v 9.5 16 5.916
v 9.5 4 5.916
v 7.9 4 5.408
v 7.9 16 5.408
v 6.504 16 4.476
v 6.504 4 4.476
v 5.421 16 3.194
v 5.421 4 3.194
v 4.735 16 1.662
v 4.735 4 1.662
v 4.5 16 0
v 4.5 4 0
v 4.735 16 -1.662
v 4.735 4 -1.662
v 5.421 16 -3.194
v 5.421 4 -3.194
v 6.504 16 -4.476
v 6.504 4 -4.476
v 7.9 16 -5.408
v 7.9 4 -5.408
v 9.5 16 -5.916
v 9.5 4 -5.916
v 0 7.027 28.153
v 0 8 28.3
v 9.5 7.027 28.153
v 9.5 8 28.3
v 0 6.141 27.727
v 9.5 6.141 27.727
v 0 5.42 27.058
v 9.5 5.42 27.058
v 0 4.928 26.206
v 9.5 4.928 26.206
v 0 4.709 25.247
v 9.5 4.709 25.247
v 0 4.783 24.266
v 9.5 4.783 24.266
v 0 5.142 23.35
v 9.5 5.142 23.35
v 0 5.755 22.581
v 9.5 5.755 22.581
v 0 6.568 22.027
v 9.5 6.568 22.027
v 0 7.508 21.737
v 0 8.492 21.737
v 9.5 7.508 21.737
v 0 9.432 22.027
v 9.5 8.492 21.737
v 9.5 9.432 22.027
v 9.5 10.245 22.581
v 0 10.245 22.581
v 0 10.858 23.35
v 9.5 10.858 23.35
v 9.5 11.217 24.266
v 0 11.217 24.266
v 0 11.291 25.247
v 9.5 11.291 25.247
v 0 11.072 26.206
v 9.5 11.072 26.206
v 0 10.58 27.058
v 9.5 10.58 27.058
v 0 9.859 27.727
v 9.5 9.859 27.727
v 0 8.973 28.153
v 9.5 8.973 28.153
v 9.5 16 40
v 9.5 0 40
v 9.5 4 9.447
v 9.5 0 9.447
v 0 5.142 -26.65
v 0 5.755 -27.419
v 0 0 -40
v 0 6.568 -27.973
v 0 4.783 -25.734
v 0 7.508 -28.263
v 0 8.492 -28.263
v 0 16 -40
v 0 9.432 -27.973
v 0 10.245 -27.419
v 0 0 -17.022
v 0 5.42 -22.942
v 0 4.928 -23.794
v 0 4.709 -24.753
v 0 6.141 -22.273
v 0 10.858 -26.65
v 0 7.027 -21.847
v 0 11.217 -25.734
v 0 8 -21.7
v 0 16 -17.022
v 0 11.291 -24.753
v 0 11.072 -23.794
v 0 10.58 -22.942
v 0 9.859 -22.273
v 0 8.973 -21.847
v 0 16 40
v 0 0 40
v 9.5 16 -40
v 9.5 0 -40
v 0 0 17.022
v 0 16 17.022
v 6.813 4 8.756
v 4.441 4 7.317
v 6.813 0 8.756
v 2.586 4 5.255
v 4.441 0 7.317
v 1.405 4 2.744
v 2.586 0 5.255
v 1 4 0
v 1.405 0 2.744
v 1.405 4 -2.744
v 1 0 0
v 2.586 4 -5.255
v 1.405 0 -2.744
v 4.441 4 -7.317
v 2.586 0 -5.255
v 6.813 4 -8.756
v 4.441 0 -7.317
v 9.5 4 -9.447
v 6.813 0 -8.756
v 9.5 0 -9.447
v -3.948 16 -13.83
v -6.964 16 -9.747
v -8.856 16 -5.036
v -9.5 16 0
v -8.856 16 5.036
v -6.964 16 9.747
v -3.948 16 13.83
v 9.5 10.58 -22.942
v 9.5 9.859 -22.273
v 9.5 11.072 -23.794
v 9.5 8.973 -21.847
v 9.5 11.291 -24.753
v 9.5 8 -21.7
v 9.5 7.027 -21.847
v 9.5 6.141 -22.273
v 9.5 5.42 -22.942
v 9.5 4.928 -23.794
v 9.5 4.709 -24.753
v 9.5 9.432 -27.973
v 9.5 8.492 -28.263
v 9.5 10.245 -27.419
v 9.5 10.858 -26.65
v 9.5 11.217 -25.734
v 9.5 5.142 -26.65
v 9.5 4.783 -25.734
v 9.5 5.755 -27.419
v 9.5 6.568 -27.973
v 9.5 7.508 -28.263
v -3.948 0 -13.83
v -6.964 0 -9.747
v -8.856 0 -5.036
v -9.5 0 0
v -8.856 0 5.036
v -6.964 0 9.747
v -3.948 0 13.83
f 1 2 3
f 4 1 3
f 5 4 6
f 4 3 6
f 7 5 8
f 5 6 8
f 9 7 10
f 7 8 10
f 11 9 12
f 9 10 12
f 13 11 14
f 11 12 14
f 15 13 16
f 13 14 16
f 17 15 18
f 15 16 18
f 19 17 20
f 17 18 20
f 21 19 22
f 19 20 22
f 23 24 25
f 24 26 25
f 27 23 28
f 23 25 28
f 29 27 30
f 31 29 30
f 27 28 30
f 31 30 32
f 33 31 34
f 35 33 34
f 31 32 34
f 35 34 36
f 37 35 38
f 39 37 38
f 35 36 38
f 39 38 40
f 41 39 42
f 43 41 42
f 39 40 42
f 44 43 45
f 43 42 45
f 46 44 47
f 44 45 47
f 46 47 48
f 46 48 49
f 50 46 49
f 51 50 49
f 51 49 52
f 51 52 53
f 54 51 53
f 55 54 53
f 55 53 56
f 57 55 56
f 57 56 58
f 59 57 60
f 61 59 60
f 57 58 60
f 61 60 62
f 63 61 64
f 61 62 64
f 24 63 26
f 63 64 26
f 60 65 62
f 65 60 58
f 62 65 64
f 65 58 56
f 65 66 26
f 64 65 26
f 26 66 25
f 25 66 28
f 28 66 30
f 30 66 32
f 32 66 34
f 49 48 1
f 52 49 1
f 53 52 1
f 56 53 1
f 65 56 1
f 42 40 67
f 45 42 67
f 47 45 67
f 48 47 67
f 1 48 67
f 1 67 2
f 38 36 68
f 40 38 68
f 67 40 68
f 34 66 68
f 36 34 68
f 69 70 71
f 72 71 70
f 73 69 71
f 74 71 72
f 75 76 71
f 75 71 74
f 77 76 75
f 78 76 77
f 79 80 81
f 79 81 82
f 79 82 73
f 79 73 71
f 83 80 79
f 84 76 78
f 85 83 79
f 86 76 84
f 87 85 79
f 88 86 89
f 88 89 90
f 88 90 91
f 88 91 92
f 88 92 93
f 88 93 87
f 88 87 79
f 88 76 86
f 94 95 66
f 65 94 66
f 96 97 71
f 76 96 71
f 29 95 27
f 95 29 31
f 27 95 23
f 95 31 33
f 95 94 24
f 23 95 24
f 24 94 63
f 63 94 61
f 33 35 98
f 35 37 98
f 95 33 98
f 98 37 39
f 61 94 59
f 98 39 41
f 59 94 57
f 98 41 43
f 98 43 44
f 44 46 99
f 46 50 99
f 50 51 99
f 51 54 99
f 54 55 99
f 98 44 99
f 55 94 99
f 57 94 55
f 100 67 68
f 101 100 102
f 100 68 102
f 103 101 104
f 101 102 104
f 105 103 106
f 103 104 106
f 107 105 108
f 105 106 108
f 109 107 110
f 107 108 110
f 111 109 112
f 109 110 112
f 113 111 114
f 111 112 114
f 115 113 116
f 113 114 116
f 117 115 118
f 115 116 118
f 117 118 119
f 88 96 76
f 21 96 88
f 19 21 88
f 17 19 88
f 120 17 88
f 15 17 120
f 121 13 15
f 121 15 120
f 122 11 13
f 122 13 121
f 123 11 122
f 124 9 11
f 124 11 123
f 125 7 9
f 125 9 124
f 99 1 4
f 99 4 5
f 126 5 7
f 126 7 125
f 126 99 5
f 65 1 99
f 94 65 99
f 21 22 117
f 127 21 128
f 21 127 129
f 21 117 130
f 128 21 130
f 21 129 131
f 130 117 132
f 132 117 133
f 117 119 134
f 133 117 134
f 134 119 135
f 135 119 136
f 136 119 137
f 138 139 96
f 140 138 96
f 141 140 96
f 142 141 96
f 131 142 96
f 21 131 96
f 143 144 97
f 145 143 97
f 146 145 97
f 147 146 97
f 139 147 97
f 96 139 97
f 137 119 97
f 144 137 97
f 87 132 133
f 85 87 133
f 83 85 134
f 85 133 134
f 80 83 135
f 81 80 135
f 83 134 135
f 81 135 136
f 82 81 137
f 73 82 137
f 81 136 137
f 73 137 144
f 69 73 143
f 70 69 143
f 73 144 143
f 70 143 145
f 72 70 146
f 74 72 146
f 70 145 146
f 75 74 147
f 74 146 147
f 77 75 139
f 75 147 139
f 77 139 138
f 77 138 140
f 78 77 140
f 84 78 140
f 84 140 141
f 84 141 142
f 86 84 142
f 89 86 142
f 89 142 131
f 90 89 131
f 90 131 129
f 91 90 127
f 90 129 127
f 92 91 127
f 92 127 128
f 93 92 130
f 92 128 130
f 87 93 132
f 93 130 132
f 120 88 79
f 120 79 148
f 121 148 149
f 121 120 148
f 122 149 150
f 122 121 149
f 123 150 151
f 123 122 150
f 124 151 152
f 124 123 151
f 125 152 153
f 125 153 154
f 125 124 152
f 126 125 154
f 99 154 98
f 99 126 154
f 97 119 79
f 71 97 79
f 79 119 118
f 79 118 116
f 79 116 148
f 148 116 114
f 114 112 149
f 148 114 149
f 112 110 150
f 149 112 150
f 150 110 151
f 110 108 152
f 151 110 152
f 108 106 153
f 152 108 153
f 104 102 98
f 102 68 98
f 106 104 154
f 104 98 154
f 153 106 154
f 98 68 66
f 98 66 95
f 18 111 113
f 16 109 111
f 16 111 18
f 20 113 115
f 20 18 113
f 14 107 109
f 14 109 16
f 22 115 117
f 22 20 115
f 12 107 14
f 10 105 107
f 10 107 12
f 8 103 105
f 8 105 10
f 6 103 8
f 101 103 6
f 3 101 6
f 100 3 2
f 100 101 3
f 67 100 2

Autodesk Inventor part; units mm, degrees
ref_plane "YZ Plane" through (0, 0, 0) normal (1, 0, 0) x (0, 1, 0)
ref_plane "XZ Plane" through (0, 0, 0) normal (0, 1, 0) x (-1, 0, 0)
ref_plane "XY Plane" through (0, 0, 0) normal (0, 0, 1) x (1, 0, 0)
sketch "Schizzo1" plane through (0, 0, 0) normal (0, 1, 0) x (-1, 0, 0)
  line L0 (9.5, 40) -> (-9.5, 40)
  line L1 (-9.5, 40) -> (-9.5, -40)
  line L2 (-9.5, -40) -> (9.5, -40)
  line L3 (9.5, -40) -> (9.5, 40)
  line L4 (9.5, 40) -> (-9.5, -40) construction
  line L5 (-9.5, 40) -> (9.5, -40) construction
  point P0 (0, 0)
  point P1 (0, 0)
  point P2 (0, 0)
  dimension "d0" = 19
  dimension "d15" = 80
extrude "Estrusione1" add sketch "Schizzo1" along normal blind 16
sketch "Schizzo2" plane through (0, 0, 0) normal (0, -1, 0) x (1, 0, 0)
  line L0 (9.5, 40) -> (9.5, -40) projected
  line L1 (9.5, 0) -> (10.5, 0)
  line L2 (9.5, 0) -> (10.5, 0) construction
  circle A0 centre (10.5, 0) radius 9.5
  point P0 (0, 0)
  dimension "d9" = 1
  dimension "d10" = 0
  dimension "d11" = 19
extrude "Estrusione2" cut sketch "Schizzo2" against normal blind 4
sketch "Schizzo4" plane through (0, 4, 0) normal (0, -1, 0) x (1, 0, 0)
  line L0 (9.5, 9.4472) -> (9.5, -9.4472) projected
  line L1 (9.5, 0) -> (10.5, 0)
  line L2 (9.5, 0) -> (10.5, 0) construction
  circle A0 centre (10.5, 0) radius 6
  point P0 (0, 0)
  point P1 (24.5, 9.5)
  point P2 (24.5, -9.5)
  dimension "d12" = 1
  dimension "d13" = 0
  dimension "d14" = 12
extrude "Estrusione3" cut sketch "Schizzo4" against normal blind 26
sketch "Schizzo8" plane through (0, 16, 0) normal (0, 1, 0) x (1, 0, 0)
  arc A0 (9.5, 5.9161) -> (9.5, -5.9161) centre (10.5, 0) ccw projected
  circle A1 centre (10.5, 0) radius 20
  line L0 (-9.5, 40) -> (-9.5, -40) projected
  line L1 (-9.5, 0) -> (-9.5, -40)
  line L2 (-9.5, -40) -> (0, -40)
  line L3 (-9.5, -40) -> (9.5, -40) projected
  line L4 (0, -40) -> (0, -17.022)
  line L5 (9.5, 40) -> (-9.5, 40) projected
  line L6 (-9.5, 0) -> (-9.5, 40)
  line L7 (-9.5, 40) -> (0, 40)
  line L8 (0, 40) -> (0, 17.022)
  point P0 (0, 0)
  dimension "d17" = 40
extrude "Estrusione4" cut sketch "Schizzo8" against normal blind 16 contours A1 L0 L5 L8 | L4 L2 L0 A1
sketch "Schizzo9" plane through (0, 16, -40) normal (-1, 0, 0) x (0, 0, 1)
  line L0 (40, -16) -> (40, -8)
  line L1 (40, -16) -> (48, -16) construction
  line L2 (40, -8) -> (15, -8)
  line L3 (40, -8) -> (65, -8)
  line L4 (40, -8) -> (65, -8) construction
  dimension "d20" = 8
  dimension "d21" = 90
  dimension "d22" = 25
  dimension "d23" = 90
  dimension "d24" = 25
  dimension "d25" = 0
hole "Foro1" at (0, 8, 25) at (0, 8, -25) direction (1, 0, 0) diameter 6.6 end through all clearance for "Bullone a testa esagonale" size "M6" standard "ANSI - Profilo M Metrico"
properties part number "15_Base_Dietro"
